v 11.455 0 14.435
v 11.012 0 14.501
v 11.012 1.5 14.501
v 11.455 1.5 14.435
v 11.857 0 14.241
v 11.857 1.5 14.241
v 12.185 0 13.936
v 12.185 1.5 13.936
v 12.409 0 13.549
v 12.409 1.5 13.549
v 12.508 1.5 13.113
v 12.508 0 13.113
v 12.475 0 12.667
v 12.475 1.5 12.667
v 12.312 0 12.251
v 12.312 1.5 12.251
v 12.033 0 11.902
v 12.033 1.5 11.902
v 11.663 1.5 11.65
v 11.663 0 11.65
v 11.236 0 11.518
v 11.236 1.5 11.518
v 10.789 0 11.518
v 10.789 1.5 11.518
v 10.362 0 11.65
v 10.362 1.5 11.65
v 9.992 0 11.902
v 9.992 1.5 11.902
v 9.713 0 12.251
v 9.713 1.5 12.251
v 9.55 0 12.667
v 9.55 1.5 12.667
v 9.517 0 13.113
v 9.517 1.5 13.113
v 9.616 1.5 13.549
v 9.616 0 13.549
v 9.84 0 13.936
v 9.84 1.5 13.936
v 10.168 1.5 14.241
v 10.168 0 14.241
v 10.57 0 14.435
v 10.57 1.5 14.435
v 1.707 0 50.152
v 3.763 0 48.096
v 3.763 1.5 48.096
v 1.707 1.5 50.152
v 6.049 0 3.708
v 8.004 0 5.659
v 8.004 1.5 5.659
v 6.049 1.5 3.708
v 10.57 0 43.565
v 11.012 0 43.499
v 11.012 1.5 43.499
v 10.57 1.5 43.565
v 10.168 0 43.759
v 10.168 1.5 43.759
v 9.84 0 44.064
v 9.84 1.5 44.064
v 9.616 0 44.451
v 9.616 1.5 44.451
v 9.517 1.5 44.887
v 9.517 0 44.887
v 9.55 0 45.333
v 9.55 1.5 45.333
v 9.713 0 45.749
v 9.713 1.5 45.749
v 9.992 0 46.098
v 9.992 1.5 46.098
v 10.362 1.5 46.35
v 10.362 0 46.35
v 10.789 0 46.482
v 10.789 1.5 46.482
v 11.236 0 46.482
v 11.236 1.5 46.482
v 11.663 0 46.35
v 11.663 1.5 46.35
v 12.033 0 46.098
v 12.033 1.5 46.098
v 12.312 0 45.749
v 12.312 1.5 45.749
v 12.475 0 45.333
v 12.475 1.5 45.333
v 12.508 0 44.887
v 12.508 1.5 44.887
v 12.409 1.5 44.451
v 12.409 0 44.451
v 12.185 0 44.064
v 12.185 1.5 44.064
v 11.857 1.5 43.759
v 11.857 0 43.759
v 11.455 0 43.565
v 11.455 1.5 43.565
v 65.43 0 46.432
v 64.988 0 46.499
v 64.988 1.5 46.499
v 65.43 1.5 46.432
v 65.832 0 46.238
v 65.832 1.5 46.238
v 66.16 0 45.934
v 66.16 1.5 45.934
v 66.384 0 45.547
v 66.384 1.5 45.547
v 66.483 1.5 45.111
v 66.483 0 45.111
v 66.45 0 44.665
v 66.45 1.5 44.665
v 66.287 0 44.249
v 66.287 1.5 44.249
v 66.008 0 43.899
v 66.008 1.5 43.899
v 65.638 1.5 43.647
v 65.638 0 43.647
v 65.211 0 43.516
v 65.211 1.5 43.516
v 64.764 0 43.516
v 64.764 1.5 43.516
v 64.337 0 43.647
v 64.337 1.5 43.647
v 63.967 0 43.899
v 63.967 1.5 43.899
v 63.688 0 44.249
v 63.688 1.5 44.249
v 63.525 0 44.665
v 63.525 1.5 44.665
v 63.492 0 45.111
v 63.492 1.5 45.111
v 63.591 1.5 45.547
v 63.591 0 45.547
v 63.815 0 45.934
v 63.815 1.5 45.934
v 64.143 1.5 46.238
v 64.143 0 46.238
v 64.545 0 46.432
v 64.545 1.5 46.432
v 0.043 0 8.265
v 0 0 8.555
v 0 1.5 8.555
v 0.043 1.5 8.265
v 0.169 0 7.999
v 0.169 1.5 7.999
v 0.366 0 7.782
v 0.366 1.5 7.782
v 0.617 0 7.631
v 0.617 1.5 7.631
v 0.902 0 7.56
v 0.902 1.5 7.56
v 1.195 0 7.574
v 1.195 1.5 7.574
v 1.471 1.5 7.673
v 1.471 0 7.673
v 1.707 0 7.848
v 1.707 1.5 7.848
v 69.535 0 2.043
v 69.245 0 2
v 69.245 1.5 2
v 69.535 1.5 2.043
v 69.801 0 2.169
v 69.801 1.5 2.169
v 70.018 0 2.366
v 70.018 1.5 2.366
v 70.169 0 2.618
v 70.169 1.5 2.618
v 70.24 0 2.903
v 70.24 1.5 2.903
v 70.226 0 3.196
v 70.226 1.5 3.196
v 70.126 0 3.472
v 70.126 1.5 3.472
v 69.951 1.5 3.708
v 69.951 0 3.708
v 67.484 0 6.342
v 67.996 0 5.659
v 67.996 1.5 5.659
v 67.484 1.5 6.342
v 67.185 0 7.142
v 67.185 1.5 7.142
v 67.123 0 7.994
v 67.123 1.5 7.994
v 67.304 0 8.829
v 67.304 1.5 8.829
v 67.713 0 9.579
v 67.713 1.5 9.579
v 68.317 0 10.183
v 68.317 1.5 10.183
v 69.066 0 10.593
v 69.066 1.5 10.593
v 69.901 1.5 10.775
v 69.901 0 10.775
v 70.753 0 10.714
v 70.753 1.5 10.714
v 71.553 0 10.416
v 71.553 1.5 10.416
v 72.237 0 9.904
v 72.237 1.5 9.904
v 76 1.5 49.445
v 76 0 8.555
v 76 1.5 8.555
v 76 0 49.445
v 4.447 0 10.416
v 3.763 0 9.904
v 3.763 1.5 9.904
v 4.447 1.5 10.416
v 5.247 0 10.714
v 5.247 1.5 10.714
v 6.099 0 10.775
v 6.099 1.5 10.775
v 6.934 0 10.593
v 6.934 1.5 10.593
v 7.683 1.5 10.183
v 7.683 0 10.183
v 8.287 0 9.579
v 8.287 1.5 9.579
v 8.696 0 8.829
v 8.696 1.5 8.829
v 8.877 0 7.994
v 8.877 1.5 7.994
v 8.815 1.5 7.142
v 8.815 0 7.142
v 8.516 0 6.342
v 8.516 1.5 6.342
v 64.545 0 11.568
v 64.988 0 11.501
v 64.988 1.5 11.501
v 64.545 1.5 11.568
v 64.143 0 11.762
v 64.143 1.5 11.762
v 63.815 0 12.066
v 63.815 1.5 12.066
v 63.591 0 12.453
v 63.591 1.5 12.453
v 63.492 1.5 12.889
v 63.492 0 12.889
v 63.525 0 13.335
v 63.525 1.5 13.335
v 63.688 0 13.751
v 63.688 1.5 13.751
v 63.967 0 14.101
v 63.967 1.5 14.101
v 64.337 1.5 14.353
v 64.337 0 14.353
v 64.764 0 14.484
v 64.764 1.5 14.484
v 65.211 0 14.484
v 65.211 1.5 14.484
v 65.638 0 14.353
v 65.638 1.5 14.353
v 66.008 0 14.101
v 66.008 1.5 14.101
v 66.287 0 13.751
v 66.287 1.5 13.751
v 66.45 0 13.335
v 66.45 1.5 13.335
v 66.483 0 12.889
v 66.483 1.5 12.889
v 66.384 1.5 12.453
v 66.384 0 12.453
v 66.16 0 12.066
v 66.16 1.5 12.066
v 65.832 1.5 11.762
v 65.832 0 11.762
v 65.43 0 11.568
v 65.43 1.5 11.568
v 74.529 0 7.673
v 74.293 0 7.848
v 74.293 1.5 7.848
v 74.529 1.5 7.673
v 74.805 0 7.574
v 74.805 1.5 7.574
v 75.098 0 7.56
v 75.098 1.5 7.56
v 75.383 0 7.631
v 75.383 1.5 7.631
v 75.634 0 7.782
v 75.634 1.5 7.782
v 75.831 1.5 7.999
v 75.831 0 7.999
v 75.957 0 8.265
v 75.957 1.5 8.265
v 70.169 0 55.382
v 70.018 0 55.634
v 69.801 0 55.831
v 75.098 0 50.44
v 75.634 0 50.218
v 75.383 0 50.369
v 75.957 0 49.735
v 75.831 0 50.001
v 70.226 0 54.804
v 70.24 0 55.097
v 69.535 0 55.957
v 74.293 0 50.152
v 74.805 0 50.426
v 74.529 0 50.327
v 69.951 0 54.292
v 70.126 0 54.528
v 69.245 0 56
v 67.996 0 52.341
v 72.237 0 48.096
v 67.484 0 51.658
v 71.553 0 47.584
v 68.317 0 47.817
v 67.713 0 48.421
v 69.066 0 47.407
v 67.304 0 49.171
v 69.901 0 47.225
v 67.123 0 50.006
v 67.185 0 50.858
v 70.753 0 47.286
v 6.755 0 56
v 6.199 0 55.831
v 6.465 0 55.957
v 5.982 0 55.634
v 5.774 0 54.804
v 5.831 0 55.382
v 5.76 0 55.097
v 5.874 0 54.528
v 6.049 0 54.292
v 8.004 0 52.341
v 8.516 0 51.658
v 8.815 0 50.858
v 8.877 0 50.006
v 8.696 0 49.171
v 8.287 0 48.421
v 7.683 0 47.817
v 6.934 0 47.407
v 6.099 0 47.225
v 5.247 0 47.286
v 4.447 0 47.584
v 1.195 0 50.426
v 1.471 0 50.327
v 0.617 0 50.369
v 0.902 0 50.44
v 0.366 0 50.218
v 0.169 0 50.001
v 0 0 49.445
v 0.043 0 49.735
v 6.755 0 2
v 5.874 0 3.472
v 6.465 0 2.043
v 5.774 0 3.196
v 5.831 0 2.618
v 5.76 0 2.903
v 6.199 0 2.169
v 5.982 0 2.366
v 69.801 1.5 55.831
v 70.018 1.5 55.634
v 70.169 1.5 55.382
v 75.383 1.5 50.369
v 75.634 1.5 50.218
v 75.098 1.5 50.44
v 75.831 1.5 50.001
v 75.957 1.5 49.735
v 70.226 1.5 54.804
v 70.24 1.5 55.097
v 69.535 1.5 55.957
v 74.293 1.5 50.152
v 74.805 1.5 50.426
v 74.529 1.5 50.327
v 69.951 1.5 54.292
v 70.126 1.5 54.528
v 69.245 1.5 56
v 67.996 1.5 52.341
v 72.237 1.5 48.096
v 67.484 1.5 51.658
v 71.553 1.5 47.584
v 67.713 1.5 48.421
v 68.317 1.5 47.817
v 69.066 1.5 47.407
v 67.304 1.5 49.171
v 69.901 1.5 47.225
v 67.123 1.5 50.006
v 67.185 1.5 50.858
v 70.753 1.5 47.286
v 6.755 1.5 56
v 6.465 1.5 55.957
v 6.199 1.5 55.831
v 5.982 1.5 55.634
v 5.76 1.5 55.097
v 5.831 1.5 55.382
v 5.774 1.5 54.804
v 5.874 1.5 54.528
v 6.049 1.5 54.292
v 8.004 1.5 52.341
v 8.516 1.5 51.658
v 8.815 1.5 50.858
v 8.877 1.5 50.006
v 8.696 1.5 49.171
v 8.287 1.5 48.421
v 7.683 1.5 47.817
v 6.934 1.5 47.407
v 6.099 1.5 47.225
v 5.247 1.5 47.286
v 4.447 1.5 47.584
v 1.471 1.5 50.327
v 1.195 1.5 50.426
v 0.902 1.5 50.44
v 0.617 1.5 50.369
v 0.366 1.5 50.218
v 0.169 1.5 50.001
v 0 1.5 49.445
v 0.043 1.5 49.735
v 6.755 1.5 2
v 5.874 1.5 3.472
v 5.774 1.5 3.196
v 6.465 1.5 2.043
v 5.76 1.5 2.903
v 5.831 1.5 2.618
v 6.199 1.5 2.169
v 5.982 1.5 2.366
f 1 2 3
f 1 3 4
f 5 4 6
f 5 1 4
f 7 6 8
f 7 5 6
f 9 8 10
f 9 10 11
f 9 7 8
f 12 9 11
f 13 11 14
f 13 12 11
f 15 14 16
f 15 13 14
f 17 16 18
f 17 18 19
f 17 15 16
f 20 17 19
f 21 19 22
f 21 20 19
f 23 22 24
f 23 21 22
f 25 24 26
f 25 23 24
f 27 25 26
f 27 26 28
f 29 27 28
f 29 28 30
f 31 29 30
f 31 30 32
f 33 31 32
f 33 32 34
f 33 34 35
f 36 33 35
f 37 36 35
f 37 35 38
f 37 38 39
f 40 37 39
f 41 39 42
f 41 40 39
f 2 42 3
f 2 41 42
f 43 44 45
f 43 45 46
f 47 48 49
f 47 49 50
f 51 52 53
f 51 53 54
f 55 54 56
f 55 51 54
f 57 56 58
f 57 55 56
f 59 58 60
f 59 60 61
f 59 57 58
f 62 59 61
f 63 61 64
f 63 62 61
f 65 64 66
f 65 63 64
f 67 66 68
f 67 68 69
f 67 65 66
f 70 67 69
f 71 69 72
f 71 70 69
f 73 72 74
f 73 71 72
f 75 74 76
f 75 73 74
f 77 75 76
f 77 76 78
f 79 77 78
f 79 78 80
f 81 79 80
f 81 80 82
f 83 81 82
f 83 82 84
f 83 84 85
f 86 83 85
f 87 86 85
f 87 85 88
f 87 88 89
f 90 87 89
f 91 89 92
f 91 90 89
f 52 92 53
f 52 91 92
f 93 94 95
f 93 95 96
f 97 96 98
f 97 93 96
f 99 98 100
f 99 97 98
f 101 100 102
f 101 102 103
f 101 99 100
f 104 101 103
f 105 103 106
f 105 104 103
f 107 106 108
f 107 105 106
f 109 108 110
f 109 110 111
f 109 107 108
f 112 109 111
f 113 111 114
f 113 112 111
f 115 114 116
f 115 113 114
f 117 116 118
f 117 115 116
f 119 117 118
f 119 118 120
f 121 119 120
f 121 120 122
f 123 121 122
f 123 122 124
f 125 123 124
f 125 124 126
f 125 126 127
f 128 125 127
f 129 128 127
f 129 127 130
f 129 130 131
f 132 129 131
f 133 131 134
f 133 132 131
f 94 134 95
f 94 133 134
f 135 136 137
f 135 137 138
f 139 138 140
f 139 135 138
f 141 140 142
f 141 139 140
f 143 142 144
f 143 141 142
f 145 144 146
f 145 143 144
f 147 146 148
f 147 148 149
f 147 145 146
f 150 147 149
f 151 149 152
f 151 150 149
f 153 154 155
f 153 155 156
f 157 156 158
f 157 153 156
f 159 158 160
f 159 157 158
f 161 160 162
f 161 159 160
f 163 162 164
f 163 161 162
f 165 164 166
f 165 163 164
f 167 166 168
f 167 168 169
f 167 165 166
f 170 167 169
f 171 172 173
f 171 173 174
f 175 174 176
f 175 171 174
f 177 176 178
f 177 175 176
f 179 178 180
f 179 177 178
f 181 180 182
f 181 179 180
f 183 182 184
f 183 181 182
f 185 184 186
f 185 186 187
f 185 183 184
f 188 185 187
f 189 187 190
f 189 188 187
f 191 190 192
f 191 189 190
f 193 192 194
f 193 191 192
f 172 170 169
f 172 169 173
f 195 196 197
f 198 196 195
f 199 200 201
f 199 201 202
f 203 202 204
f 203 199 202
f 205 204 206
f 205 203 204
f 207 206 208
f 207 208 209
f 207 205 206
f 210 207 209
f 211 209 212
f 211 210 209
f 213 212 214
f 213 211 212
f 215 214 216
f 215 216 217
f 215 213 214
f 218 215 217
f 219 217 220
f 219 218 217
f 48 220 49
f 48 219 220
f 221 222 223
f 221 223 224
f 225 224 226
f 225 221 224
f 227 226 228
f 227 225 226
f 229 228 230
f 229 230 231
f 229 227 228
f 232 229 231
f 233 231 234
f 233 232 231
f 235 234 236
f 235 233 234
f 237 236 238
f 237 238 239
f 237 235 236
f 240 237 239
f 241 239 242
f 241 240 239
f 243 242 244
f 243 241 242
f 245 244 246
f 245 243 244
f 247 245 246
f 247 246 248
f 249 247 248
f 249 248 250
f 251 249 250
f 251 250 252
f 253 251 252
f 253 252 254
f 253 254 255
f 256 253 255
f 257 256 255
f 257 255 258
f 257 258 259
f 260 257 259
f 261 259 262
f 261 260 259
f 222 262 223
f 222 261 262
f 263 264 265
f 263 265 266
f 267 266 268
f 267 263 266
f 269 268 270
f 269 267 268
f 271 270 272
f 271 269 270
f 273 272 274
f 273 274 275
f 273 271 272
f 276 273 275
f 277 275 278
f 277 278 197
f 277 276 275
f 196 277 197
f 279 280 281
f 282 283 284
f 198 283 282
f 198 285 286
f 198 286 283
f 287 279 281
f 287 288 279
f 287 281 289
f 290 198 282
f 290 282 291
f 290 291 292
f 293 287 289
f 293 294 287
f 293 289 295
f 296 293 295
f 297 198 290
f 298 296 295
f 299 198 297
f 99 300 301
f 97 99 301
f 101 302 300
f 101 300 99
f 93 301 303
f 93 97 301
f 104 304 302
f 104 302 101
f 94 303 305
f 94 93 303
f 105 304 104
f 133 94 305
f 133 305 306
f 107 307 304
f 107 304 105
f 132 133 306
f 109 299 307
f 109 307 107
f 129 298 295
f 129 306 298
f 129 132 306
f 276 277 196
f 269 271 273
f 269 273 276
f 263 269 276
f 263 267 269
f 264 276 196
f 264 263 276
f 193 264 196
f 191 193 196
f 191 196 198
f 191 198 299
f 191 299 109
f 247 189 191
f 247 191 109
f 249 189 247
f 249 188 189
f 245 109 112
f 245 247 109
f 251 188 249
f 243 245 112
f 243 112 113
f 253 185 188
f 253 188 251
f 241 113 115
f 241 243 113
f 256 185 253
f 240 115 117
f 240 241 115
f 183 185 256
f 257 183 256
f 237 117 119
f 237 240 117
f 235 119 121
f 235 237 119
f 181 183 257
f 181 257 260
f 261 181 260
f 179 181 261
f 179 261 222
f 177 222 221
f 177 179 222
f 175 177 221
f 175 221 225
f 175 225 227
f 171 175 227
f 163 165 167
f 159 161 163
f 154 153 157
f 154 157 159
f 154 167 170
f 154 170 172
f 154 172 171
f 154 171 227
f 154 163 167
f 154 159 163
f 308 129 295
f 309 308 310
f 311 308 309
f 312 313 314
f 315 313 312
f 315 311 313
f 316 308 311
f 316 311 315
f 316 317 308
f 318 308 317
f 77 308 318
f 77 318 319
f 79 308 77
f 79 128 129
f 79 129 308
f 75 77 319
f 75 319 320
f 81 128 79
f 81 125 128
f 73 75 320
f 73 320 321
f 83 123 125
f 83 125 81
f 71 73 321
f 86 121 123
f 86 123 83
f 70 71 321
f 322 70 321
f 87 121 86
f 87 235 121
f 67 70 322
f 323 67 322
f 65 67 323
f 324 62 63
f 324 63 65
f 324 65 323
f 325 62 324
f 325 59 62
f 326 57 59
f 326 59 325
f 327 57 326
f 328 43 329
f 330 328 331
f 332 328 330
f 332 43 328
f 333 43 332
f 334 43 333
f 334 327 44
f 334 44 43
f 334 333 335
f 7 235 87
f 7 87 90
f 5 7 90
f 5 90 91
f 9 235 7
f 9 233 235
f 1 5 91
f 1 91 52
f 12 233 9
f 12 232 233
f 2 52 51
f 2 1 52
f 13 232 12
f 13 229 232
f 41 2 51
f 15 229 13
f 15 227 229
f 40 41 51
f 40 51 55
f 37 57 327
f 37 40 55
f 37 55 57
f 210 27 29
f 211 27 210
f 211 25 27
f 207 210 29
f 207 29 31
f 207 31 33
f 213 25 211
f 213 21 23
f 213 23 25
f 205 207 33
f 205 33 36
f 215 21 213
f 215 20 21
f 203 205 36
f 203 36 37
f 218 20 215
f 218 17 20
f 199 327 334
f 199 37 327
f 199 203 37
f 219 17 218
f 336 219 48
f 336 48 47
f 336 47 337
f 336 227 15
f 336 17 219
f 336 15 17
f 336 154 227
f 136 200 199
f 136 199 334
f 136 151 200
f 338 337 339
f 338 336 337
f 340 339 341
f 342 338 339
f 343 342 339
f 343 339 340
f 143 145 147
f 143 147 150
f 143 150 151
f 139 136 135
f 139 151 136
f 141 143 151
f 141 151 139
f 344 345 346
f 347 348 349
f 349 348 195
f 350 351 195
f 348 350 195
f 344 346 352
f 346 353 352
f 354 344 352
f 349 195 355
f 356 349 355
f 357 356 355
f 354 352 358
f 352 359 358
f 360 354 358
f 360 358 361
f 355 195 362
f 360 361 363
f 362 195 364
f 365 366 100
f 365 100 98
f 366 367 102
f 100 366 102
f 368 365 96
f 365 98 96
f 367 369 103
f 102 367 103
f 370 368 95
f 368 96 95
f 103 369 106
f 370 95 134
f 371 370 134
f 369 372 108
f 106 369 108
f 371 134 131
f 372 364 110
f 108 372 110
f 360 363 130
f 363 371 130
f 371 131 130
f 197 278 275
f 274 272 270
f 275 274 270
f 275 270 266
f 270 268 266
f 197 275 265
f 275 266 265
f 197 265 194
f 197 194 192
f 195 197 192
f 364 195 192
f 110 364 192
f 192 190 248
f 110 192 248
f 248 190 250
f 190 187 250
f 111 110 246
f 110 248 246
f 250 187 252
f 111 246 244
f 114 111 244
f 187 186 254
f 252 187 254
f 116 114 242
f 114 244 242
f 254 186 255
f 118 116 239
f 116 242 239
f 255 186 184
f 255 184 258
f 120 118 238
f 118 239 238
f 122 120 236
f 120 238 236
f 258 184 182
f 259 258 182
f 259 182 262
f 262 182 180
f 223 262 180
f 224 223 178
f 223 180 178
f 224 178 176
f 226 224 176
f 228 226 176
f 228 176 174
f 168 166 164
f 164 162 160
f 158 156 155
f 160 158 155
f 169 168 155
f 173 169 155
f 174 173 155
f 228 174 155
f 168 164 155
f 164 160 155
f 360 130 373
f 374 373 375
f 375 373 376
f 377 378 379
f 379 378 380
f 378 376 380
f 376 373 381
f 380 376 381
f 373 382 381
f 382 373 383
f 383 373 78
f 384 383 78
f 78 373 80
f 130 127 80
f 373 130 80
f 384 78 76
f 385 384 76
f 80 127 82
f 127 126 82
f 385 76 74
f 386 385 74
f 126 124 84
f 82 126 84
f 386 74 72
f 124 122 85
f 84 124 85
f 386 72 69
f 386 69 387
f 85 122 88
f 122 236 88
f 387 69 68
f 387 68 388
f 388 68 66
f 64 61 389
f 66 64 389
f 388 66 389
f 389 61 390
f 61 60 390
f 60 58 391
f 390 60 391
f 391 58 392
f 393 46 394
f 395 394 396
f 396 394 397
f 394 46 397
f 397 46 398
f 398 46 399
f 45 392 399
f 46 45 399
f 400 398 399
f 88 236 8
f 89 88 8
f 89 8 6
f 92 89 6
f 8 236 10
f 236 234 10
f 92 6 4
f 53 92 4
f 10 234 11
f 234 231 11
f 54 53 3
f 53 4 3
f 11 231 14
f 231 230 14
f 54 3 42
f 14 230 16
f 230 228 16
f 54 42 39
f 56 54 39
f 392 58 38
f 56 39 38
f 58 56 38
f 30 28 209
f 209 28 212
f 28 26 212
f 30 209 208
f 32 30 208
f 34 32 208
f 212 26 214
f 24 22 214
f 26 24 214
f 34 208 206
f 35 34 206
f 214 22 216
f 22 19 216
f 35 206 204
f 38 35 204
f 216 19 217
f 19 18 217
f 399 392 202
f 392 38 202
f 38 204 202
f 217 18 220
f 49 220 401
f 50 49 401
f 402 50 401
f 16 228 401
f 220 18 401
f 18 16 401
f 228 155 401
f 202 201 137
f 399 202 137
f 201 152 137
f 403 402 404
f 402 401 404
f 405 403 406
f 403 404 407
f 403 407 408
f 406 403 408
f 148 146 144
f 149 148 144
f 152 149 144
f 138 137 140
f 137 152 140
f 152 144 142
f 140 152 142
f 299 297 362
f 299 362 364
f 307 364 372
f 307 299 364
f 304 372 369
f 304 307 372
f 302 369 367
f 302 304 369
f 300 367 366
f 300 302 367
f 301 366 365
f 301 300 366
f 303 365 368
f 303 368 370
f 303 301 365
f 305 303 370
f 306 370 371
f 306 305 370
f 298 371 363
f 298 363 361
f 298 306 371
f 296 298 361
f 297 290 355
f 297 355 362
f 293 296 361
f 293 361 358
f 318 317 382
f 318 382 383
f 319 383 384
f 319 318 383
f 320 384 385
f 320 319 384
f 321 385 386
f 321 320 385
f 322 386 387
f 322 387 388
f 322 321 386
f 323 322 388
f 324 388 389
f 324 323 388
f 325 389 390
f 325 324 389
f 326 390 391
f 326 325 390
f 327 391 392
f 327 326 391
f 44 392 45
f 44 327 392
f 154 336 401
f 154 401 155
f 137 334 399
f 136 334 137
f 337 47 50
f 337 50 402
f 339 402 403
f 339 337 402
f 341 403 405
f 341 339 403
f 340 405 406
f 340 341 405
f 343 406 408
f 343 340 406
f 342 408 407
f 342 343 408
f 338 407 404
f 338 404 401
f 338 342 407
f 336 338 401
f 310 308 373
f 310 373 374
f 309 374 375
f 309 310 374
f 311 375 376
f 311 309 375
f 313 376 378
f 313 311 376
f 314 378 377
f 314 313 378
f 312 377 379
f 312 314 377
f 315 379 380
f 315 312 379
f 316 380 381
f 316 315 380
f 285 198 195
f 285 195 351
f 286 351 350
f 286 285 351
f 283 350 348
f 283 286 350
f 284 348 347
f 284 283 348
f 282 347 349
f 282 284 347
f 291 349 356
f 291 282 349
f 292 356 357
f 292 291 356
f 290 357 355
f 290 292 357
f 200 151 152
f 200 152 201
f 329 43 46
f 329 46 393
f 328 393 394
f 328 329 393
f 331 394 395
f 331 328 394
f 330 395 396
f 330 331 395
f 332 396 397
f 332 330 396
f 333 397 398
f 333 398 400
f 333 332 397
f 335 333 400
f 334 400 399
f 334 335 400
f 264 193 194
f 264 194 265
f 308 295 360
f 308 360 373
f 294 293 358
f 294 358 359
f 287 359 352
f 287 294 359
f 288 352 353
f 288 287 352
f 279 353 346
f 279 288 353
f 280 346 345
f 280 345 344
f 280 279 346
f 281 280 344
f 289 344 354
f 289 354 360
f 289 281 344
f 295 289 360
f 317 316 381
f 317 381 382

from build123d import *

# Parameters (mm, degrees)
SKETCH1_R           = 1.5
BOSS_EXTRUDE1_DEPTH = 1.5


with BuildPart() as part:
    # Sketch1 → Boss-Extrude1 (new body)
    with BuildSketch(Plane(origin=(0, 0, 0), x_dir=(1, 0, 0), z_dir=(0, 1, 0))):
        with BuildLine():
            Line((6.755042478, -2), (69.244957522, -2))
            ThreePointArc((69.244957522, -2), (70.169022091, -2.617763592), (69.951379765, -3.707790657))
            Line((69.951379765, -3.707790657), (67.996333944, -5.65905667))
            ThreePointArc((67.996333944, -5.65905667), (67.993254266, -9.902722426), (72.236921016, -9.903748986))
            Line((72.236921016, -9.903748986), (74.292893219, -7.847776783))
            ThreePointArc((74.292893219, -7.847776783), (75.382683432, -7.631004031), (76, -8.554883564))
            Line((76, -8.554883564), (76, -49.445116436))
            ThreePointArc((76, -49.445116436), (75.382683432, -50.368995969), (74.292893219, -50.152223217))
            Line((74.292893219, -50.152223217), (72.236921016, -48.096251014))
            ThreePointArc((72.236921016, -48.096251014), (67.993254266, -48.097277574), (67.996333944, -52.34094333))
            Line((67.996333944, -52.34094333), (69.951379765, -54.292209343))
            ThreePointArc((69.951379765, -54.292209343), (70.169022091, -55.382236408), (69.244957522, -56))
            Line((69.244957522, -56), (6.755042478, -56))
            ThreePointArc((6.755042478, -56), (5.830977909, -55.382236408), (6.048620235, -54.292209343))
            Line((6.048620235, -54.292209343), (8.003666056, -52.34094333))
            ThreePointArc((8.003666056, -52.34094333), (8.006745734, -48.097277574), (3.763078984, -48.096251014))
            Line((3.763078984, -48.096251014), (1.707106781, -50.152223217))
            ThreePointArc((1.707106781, -50.152223217), (0.617316568, -50.368995969), (0, -49.445116436))
            Line((0, -49.445116436), (0, -8.554883564))
            ThreePointArc((0, -8.554883564), (0.617316568, -7.631004031), (1.707106781, -7.847776783))
            Line((1.707106781, -7.847776783), (3.763078984, -9.903748986))
            ThreePointArc((3.763078984, -9.903748986), (8.006745734, -9.902722426), (8.003666056, -5.65905667))
            Line((8.003666056, -5.65905667), (6.048620235, -3.707790657))
            ThreePointArc((6.048620235, -3.707790657), (5.830977909, -2.617763592), (6.755042478, -2))
        make_face()
        with Locations(Location((11.0125, -13.001163208, 0), (0, 0, 270))):
            Circle(SKETCH1_R, mode=Mode.SUBTRACT)
        with Locations(Location((64.9875, -13.001163208, 0), (0, 0, 90))):
            Circle(SKETCH1_R, mode=Mode.SUBTRACT)
        with Locations(Location((64.9875, -44.998836792, 0), (0, 0, 270))):
            Circle(SKETCH1_R, mode=Mode.SUBTRACT)
        with Locations(Location((11.0125, -44.998836792, 0), (0, 0, 90))):
            Circle(SKETCH1_R, mode=Mode.SUBTRACT)
    extrude(amount=BOSS_EXTRUDE1_DEPTH)


solid = part.part
